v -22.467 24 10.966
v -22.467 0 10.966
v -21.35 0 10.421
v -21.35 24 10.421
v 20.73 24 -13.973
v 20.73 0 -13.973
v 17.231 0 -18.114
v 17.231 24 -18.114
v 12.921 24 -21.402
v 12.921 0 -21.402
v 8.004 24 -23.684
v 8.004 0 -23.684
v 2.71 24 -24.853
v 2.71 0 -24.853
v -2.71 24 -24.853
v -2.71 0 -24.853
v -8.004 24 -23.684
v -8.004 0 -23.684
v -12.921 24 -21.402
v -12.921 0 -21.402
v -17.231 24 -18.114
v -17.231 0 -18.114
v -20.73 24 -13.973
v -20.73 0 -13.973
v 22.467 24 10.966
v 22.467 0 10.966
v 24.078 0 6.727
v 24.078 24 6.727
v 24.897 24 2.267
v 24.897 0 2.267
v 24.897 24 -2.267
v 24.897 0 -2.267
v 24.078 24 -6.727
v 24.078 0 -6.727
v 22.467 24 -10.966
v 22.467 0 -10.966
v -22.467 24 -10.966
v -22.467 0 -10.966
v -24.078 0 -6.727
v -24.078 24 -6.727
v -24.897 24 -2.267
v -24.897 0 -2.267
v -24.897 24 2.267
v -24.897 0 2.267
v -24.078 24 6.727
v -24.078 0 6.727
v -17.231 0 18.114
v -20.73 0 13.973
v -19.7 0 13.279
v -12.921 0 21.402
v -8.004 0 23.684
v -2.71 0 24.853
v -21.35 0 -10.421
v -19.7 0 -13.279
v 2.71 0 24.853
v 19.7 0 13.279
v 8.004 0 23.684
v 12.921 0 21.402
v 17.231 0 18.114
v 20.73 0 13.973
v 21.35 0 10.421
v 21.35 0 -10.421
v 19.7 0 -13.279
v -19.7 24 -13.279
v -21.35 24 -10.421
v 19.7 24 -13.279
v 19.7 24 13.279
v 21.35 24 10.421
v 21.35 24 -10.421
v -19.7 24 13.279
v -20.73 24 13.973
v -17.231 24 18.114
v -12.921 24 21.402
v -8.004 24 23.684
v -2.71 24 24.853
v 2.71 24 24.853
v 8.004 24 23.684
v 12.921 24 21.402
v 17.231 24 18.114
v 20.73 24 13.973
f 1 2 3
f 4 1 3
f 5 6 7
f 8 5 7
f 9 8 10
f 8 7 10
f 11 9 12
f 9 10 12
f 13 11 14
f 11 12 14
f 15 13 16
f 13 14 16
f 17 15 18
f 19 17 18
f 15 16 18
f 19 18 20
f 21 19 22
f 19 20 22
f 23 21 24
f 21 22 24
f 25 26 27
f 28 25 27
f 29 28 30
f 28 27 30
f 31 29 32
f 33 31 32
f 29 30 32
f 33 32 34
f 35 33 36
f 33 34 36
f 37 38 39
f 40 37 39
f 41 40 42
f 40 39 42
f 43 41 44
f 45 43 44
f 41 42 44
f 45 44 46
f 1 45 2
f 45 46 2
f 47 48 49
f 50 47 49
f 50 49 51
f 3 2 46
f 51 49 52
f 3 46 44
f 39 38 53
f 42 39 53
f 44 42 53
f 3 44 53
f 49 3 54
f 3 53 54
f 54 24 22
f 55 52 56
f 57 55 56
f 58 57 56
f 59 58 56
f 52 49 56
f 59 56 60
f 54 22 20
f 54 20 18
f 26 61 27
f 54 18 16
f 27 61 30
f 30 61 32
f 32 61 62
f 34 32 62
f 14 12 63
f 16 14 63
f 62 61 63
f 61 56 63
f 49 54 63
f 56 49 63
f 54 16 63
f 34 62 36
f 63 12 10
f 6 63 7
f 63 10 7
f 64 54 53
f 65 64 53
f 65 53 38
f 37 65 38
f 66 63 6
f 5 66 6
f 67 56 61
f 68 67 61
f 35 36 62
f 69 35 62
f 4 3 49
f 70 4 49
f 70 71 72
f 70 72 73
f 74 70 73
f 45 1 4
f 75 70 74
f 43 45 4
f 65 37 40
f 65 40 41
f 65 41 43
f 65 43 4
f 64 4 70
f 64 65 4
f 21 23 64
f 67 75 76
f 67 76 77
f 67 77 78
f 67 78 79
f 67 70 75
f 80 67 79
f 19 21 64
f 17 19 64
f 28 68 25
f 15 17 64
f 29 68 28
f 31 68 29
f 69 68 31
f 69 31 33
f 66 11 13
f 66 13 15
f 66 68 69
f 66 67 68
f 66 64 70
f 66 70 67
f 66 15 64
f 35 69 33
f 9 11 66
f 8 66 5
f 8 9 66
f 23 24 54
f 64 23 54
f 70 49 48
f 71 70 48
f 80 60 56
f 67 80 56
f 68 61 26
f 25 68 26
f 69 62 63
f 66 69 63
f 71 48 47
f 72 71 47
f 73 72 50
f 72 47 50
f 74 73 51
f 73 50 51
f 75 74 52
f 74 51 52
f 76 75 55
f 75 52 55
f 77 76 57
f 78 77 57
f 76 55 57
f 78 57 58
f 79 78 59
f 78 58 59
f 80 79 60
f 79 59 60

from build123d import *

# Parameters (mm, degrees)
BOSS_EXTRUDE1_DEPTH = 24


with BuildPart() as part:
    # Sketch1 → Boss-Extrude1 (new body)
    with BuildSketch(Plane(origin=(0, 0, 0), x_dir=(1, 0, 0), z_dir=(0, 1, 0))):
        with BuildLine():
            Line((21.34980207, 10.421058084), (19.69980207, 13.278941916))
            Line((19.69980207, 13.278941916), (20.730203224, 13.973499))
            ThreePointArc((20.730203224, 13.973499), (0, 25), (-20.730203224, 13.973499))
            Line((-20.730203224, 13.973499), (-19.69980207, 13.278941916))
            Line((-19.69980207, 13.278941916), (-21.34980207, 10.421058084))
            Line((-21.34980207, 10.421058084), (-22.466506726, 10.966133117))
            ThreePointArc((-22.466506726, 10.966133117), (-25, 0), (-22.466506726, -10.966133117))
            Line((-22.466506726, -10.966133117), (-21.34980207, -10.421058084))
            Line((-21.34980207, -10.421058084), (-19.69980207, -13.278941916))
            Line((-19.69980207, -13.278941916), (-20.730203224, -13.973499))
            ThreePointArc((-20.730203224, -13.973499), (0, -25), (20.730203224, -13.973499))
            Line((20.730203224, -13.973499), (19.69980207, -13.278941916))
            Line((19.69980207, -13.278941916), (21.34980207, -10.421058084))
            Line((21.34980207, -10.421058084), (22.466506726, -10.966133117))
            ThreePointArc((22.466506726, -10.966133117), (25, 0), (22.466506726, 10.966133117))
            Line((22.466506726, 10.966133117), (21.34980207, 10.421058084))
        make_face()
    extrude(amount=BOSS_EXTRUDE1_DEPTH)


solid = part.part
